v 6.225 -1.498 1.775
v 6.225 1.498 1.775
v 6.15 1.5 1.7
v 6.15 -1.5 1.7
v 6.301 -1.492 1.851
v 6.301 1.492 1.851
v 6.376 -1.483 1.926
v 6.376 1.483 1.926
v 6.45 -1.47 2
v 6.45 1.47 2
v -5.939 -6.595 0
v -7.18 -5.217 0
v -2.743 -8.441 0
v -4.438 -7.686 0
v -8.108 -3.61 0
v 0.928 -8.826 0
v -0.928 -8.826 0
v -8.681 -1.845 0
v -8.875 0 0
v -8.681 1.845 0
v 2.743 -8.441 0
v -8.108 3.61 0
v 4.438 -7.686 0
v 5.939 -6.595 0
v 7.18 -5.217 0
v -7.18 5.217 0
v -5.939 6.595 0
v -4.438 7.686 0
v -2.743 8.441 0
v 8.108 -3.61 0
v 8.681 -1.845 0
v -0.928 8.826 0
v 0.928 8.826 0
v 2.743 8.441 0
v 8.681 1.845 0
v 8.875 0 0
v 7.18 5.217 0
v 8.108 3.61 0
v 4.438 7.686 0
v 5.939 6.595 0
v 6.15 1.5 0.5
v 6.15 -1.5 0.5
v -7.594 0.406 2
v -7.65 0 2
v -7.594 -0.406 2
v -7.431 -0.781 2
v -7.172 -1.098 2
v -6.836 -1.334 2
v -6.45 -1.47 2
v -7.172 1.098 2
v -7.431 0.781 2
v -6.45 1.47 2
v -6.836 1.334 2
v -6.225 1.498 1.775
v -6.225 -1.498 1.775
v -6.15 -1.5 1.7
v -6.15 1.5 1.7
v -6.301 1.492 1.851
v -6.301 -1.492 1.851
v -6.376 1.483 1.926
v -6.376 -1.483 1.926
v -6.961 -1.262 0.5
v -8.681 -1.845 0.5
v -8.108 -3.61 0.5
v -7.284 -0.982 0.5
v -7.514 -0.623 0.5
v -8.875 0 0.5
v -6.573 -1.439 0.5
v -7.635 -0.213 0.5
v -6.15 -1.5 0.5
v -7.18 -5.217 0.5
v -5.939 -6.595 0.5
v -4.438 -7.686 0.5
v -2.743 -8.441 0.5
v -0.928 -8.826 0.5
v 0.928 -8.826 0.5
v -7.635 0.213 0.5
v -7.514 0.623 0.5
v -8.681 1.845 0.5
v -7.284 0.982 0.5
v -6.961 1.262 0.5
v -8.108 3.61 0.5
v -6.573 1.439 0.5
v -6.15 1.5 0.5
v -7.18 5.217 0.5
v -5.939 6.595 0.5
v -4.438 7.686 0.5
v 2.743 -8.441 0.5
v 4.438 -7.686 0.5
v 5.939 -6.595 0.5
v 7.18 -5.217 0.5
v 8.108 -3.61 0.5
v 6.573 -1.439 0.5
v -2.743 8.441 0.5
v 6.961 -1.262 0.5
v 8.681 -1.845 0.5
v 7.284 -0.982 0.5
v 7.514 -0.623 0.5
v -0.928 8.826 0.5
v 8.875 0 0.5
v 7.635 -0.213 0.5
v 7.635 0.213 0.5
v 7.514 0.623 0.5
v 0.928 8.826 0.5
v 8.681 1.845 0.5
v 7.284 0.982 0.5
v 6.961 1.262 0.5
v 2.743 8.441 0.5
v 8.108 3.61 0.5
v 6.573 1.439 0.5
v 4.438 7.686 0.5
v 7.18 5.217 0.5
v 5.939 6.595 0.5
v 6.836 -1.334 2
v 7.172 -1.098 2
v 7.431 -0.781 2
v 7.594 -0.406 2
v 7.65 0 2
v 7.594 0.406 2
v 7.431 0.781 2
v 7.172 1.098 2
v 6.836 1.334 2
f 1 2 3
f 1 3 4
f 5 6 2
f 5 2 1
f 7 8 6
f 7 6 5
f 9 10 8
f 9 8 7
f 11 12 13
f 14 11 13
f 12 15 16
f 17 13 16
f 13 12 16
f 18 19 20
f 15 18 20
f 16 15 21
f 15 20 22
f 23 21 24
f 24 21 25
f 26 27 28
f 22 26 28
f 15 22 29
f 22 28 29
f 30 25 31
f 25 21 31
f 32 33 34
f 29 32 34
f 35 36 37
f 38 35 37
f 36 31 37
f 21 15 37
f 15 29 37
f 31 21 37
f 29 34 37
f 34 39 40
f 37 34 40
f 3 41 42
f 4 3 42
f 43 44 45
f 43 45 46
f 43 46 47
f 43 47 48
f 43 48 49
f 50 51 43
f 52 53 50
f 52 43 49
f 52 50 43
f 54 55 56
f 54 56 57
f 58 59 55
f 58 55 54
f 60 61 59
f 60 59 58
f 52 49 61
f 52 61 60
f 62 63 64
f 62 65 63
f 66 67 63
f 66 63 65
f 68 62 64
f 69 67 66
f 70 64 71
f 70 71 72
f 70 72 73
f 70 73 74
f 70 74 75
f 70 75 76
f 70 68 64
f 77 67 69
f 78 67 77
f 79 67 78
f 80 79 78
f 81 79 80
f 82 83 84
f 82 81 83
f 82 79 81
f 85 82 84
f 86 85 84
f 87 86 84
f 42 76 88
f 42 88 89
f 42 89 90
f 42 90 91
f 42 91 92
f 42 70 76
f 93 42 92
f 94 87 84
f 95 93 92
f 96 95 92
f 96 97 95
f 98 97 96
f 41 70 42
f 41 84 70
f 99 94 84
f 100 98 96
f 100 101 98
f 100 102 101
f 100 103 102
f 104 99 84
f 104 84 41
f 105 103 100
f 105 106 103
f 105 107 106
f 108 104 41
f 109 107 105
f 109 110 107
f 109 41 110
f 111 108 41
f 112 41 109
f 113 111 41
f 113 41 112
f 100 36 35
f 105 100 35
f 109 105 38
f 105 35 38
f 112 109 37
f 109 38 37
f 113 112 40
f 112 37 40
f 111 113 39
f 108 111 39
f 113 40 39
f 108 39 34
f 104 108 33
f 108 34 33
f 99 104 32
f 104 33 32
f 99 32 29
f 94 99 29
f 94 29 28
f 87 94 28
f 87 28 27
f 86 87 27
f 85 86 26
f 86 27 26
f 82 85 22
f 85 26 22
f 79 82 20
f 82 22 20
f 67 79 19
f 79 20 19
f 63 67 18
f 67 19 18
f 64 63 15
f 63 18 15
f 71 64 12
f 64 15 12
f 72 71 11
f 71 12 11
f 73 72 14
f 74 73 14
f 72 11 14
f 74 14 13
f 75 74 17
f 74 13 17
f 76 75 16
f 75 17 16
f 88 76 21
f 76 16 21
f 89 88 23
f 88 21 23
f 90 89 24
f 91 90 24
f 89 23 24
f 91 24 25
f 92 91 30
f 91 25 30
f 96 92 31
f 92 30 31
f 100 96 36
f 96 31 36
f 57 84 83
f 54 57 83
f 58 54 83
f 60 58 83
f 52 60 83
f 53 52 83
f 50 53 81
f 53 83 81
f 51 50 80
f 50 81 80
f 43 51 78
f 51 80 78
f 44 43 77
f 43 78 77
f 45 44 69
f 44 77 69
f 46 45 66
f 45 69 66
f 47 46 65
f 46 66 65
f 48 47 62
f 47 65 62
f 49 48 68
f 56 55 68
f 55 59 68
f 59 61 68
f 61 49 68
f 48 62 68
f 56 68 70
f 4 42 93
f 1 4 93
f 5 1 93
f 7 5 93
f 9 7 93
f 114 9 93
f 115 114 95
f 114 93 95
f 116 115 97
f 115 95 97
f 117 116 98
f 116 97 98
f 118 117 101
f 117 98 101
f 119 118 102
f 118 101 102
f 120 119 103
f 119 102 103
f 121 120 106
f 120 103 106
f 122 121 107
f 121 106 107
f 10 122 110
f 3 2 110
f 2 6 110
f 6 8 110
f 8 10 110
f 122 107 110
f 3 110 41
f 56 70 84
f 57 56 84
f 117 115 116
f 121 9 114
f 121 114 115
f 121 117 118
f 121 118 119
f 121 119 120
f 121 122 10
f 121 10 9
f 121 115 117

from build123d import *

# Parameters (mm, degrees)
F0_R     = 8.875
F1_DEPTH = 0.5
F3_DEPTH = 1.5
F4_SIZE  = 0.3


with BuildPart() as f1:
    # F0 (on Top) → F1 (new body)
    with BuildSketch(Plane.XY):
        Circle(F0_R)
    extrude(amount=F1_DEPTH)

    # F2 (on face) → F3 (join)
    with BuildSketch(Plane.XY.offset(0.5)):
        with BuildLine():
            Line((-6.15, -1.5), (-6.15, 1.5))
            ThreePointArc((-6.15, 1.5), (-7.65, 0), (-6.15, -1.5))
        make_face()
        with BuildLine():
            ThreePointArc((6.15, -1.5), (7.65, 0), (6.15, 1.5))
            Line((6.15, 1.5), (6.15, -1.5))
        make_face()
    extrude(amount=F3_DEPTH)

    # F4
    f4_edges = [f1.edges().sort_by_distance(p)[0] for p in [
        (-6.15, 0, 2),
        (6.15, 0, 2),
    ]]
    chamfer(f4_edges, length=F4_SIZE)


solid = f1.part
